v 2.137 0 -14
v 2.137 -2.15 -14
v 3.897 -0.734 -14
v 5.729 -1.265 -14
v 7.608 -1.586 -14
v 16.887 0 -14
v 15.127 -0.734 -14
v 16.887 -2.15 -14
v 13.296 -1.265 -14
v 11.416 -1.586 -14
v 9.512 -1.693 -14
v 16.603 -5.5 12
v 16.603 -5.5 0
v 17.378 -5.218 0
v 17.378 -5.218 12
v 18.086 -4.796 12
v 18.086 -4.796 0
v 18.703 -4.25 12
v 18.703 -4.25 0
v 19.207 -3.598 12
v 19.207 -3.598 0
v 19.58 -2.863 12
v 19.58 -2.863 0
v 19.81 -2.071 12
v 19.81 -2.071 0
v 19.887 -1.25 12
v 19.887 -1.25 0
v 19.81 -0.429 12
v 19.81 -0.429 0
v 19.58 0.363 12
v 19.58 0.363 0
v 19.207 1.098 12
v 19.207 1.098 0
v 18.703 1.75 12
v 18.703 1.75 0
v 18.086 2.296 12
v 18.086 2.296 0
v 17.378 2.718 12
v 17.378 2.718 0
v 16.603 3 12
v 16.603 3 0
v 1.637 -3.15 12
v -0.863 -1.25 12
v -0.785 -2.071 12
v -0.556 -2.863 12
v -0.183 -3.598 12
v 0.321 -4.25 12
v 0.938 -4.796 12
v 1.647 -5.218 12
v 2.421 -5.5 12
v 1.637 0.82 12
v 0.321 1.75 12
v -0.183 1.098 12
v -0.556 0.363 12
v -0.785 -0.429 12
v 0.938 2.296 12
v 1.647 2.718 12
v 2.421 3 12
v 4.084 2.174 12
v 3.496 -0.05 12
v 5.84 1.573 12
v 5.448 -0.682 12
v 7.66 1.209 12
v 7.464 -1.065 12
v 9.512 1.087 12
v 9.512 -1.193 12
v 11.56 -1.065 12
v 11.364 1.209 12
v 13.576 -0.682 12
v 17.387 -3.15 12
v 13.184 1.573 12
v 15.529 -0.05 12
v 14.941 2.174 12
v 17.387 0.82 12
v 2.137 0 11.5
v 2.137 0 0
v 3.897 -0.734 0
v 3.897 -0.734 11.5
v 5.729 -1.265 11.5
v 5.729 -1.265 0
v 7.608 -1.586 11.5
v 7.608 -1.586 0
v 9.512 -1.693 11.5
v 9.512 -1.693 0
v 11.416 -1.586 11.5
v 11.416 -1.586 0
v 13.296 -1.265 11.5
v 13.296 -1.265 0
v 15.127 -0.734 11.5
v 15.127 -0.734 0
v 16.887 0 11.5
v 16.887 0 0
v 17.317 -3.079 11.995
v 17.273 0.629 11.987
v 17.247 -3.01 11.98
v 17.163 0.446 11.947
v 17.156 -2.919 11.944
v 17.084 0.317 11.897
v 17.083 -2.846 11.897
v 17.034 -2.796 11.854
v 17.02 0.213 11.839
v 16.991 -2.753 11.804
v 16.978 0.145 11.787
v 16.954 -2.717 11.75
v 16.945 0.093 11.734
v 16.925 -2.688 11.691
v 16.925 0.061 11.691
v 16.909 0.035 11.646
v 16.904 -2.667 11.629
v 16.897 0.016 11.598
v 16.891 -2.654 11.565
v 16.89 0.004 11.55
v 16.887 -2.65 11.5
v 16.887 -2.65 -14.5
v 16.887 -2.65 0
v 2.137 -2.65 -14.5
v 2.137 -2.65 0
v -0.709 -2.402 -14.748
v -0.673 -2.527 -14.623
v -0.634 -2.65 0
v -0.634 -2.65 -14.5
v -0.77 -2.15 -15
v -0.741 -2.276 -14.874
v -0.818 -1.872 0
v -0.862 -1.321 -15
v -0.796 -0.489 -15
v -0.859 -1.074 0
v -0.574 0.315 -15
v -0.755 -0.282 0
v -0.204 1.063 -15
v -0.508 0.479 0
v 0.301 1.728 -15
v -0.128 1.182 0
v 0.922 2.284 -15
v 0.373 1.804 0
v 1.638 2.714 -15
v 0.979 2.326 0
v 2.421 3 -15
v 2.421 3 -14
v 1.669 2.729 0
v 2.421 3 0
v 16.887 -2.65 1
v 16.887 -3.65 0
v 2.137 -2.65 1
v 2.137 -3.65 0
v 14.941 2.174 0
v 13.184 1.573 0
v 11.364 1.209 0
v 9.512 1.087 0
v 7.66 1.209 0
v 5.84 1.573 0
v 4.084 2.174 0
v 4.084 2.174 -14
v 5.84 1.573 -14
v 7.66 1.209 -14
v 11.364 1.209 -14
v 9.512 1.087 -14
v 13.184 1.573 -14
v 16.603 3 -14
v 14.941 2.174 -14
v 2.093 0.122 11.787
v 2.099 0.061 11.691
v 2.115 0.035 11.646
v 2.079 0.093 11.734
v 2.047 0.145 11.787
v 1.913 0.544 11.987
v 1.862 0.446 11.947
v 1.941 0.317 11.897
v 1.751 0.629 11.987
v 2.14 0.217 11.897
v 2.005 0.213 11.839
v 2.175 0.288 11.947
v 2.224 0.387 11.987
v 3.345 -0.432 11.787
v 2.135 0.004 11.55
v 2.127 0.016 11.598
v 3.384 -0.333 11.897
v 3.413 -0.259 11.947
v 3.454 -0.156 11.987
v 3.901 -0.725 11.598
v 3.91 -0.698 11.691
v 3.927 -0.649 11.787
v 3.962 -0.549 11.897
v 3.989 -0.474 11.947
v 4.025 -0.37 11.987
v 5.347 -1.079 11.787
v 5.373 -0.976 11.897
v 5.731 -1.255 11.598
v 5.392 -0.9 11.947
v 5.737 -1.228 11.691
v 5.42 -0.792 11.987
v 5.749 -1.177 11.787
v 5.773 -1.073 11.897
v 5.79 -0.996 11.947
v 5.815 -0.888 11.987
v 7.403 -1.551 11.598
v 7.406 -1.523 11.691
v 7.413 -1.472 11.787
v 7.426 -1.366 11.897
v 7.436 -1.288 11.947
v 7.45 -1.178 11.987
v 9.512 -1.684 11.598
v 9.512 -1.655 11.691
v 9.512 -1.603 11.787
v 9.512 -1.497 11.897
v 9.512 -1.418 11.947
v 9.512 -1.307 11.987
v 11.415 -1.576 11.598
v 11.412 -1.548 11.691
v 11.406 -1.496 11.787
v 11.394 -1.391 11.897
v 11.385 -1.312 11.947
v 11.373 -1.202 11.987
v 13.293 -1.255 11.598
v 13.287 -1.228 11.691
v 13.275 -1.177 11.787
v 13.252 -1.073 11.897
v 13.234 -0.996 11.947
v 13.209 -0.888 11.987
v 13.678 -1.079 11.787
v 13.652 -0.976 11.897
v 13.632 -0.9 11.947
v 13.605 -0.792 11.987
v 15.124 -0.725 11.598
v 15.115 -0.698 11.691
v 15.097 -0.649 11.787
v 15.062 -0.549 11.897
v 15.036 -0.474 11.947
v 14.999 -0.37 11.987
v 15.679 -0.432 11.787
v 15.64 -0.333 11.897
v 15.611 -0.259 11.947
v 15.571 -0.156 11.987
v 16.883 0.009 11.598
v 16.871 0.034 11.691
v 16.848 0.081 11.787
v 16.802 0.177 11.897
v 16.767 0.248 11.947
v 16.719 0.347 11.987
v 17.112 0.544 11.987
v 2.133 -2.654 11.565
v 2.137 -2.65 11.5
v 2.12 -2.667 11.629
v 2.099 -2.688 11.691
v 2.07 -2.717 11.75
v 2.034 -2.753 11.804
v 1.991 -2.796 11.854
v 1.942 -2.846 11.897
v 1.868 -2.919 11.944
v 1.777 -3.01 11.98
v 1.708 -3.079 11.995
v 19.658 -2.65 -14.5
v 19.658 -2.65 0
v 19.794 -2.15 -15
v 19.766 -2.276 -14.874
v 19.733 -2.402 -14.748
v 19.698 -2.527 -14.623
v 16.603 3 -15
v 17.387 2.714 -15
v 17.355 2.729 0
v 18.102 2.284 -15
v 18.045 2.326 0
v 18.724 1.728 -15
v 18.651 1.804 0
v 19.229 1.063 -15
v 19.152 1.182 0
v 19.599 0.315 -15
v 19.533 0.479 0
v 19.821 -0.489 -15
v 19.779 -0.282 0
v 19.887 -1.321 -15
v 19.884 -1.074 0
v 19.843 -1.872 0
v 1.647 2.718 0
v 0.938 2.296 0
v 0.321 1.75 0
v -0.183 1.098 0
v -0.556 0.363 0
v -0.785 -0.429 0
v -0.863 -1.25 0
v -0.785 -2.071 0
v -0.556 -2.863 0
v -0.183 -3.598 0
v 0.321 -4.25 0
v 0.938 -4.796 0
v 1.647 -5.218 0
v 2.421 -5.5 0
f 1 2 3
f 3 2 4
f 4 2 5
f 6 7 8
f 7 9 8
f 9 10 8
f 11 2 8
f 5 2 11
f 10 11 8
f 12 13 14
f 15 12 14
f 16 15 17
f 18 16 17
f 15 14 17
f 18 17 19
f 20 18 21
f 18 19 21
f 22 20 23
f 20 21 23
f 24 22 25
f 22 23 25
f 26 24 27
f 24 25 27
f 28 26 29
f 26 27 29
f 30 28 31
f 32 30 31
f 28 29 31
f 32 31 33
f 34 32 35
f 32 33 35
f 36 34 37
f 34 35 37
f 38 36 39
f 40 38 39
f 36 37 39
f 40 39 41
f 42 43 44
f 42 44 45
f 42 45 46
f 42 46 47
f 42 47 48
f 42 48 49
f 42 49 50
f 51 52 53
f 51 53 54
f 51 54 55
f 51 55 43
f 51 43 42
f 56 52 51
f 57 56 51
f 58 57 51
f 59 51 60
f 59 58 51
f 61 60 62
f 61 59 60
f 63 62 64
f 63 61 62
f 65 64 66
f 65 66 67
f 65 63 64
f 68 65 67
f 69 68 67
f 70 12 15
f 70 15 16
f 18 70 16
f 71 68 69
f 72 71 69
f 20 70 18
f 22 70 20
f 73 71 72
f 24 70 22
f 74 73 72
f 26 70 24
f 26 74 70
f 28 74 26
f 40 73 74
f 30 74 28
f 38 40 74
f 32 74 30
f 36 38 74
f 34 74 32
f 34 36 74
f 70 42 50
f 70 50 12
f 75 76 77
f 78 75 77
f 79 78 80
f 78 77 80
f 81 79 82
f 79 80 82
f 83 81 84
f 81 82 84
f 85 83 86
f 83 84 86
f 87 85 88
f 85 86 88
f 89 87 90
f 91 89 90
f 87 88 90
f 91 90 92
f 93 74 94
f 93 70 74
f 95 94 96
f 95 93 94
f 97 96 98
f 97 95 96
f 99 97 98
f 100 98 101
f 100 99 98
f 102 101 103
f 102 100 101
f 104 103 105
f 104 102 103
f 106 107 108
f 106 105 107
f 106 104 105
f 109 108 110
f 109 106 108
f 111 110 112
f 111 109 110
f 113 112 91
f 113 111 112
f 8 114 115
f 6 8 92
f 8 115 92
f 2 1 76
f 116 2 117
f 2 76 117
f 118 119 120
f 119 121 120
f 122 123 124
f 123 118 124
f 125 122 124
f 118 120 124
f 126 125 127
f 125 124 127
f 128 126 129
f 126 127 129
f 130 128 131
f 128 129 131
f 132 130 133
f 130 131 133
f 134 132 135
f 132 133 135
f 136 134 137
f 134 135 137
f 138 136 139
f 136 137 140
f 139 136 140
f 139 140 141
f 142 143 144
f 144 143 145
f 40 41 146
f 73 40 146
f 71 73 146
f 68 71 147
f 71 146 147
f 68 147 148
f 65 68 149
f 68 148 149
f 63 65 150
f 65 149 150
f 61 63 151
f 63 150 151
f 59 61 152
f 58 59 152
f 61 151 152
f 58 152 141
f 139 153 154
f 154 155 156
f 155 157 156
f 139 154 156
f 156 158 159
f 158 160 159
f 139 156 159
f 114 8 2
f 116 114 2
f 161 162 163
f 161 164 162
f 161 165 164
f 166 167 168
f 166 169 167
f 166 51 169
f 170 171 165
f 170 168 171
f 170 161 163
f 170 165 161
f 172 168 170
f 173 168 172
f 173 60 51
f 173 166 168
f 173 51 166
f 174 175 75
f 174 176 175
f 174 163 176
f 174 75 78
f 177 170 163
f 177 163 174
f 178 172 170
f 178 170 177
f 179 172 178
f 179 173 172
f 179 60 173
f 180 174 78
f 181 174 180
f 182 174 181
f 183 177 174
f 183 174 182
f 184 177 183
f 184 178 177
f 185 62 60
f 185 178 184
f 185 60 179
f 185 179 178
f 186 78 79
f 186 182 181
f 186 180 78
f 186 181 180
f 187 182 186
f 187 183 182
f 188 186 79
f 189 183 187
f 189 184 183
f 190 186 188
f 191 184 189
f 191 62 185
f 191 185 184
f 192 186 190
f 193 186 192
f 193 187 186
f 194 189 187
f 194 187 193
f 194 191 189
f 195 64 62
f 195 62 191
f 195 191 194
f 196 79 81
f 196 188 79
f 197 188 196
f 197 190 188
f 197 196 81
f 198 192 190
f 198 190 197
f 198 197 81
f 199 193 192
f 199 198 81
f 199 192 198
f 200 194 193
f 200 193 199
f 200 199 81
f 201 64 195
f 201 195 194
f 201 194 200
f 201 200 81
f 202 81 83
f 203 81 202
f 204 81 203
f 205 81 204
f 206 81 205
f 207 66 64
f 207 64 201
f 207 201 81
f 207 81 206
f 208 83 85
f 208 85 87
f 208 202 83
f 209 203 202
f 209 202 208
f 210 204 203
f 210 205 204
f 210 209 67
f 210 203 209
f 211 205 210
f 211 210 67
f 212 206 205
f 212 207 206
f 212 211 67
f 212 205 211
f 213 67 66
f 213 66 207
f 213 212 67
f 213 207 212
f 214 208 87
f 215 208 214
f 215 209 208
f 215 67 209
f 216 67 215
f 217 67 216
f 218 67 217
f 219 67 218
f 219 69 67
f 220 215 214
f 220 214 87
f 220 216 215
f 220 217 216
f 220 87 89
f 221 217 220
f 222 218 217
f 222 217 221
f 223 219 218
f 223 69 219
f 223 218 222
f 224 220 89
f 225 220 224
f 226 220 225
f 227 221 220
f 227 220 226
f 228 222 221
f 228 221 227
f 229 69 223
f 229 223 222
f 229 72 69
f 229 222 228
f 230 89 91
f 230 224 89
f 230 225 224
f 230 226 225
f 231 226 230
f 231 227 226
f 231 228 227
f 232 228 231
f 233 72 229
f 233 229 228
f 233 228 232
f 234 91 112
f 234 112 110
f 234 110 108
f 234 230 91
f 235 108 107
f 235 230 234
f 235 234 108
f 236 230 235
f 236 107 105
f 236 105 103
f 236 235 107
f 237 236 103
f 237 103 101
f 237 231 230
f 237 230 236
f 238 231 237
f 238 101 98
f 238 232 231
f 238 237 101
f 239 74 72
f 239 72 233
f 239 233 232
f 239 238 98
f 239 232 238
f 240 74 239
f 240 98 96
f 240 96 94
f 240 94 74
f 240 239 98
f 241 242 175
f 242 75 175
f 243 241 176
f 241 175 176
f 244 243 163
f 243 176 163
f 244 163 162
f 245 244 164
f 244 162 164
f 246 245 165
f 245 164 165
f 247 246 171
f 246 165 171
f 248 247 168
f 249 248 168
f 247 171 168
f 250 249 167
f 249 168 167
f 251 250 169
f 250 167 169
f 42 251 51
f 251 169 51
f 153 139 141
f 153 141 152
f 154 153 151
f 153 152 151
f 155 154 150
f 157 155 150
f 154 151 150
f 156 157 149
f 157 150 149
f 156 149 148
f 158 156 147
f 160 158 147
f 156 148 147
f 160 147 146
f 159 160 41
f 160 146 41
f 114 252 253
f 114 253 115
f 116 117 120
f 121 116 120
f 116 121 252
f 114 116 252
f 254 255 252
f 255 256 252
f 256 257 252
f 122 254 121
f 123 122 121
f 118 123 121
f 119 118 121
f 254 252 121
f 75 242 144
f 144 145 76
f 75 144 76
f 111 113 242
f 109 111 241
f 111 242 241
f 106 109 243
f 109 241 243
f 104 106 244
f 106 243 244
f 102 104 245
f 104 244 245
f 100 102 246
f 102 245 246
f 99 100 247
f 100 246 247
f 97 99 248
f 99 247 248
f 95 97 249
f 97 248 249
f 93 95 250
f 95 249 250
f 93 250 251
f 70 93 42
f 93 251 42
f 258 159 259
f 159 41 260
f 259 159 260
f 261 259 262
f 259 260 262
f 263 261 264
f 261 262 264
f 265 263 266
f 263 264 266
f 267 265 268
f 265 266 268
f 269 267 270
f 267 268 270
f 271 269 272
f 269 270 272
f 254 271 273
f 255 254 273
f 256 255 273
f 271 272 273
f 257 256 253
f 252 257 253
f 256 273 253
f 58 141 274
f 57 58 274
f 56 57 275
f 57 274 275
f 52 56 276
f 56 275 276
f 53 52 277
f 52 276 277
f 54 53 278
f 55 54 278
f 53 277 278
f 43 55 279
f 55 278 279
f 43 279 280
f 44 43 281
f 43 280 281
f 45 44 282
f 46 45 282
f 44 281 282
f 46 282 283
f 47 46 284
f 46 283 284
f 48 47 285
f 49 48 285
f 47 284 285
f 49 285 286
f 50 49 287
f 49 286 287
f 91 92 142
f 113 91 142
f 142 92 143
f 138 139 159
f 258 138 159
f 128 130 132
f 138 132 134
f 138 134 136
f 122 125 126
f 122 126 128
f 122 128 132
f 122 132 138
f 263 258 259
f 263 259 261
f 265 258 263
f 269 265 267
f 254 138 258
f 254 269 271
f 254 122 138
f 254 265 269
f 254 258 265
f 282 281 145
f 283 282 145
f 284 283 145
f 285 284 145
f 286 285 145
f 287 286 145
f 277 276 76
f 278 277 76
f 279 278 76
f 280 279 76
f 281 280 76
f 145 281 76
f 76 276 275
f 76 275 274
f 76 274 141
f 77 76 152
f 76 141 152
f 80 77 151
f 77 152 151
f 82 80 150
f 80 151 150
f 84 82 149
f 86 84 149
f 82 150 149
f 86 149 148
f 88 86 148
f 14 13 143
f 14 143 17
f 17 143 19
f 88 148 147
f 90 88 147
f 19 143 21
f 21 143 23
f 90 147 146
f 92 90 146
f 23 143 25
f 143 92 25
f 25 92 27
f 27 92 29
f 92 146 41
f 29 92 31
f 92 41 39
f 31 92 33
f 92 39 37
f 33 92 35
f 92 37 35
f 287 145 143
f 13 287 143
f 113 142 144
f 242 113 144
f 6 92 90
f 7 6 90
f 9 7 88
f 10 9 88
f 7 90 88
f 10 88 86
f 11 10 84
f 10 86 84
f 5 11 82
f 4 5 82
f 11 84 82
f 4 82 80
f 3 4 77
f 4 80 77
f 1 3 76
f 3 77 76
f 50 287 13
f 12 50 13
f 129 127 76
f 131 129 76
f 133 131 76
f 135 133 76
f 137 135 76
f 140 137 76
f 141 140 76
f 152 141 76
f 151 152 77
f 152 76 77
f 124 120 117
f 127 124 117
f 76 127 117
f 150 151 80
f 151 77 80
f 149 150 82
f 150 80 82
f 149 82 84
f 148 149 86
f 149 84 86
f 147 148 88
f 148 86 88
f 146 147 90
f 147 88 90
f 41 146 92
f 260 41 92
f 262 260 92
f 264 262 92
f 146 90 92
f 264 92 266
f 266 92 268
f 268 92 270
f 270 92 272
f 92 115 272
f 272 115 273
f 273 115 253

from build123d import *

# Parameters (mm, degrees)
F1_DEPTH = 12
F3_DEPTH = 14
F5_DEPTH = 1
F6_SIZE  = 0.5
F7_SIZE  = 1
F8_SIZE  = 0.49999
F9_R     = 0.5


# Not quite as in the source:
# - a fillet or chamfer is up to 0.001 mm smaller than in the source, because OpenCascade refuses the exact size


with BuildPart() as f1:
    # F0 (on Top) → F1 (new body)
    with BuildSketch(Plane.XY):
        with BuildLine():
            ThreePointArc((2.421303573, 3), (-0.8627873361, -1.25), (2.421303573, -5.5))
            Line((2.421303573, -5.5), (16.6031217548, -5.5))
            ThreePointArc((16.6031217548, -5.5), (19.8872126639, -1.25), (16.6031217548, 3))
            ThreePointArc((16.6031217548, 3), (9.5122126639, 1.0867768062), (2.421303573, 3))
        make_face()
        with BuildLine():
            Line((4.6372126639, -2.65), (2.1372126639, -2.65))
            Line((2.1372126639, -2.65), (2.1372126639, 0))
            ThreePointArc((2.1372126639, 0), (9.5122126639, -1.6934638377), (16.8872126639, 0))
            Line((16.8872126639, 0), (16.8872126639, -2.65))
            Line((16.8872126639, -2.65), (4.6372126639, -2.65))
        make_face(mode=Mode.SUBTRACT)
    extrude(amount=F1_DEPTH)

    # F7
    f7_edges = [f1.edges().sort_by_distance(p)[0] for p in [
        (9.512213, -2.65, 0),
    ]]
    chamfer(f7_edges, length=F7_SIZE)

    # F9
    f9_edges = [f1.edges().sort_by_distance(p)[0] for p in [
        (9.512213, -2.65, 12),
        (2.137213, -1.325, 12),
        (9.512213, -1.693464, 12),
        (16.887213, -1.325, 12),
    ]]
    fillet(f9_edges, radius=F9_R)


with BuildPart() as f3:
    # F2 (on face) → F3 (new body)
    with BuildSketch(Plane(origin=(0, 0, 0), x_dir=(1, 0, 0), z_dir=(0, 0, -1))):
        with BuildLine():
            ThreePointArc((-0.6336811406, 2.65), (-0.3341866365, -0.8389848971), (2.421303573, -3))
            ThreePointArc((2.421303573, -3), (9.5122126639, -1.0867768062), (16.6031217548, -3))
            ThreePointArc((16.6031217548, -3), (19.3586119643, -0.8389848971), (19.6581064684, 2.65))
            Line((19.6581064684, 2.65), (16.8872126639, 2.65))
            Line((16.8872126639, 2.65), (16.8872126639, 0))
            ThreePointArc((16.8872126639, 0), (9.5122126639, 1.6934638377), (2.1372126639, 0))
            Line((2.1372126639, 0), (2.1372126639, 2.65))
            Line((2.1372126639, 2.65), (-0.6336811406, 2.65))
        make_face()
    extrude(amount=F3_DEPTH)

    # F4 (on face) → F5 (join)
    with BuildSketch(Plane(origin=(0, 0, -14), x_dir=(1, 0, 0), z_dir=(0, 0, -1))):
        with BuildLine():
            ThreePointArc((-0.6336811406, 2.65), (-0.3341866365, -0.8389848971), (2.421303573, -3))
            Line((2.421303573, -3), (16.6031217548, -3))
            ThreePointArc((16.6031217548, -3), (19.3586119643, -0.8389848971), (19.6581064684, 2.65))
            Line((19.6581064684, 2.65), (-0.6336811406, 2.65))
        make_face()
    extrude(amount=F5_DEPTH)

    # F6
    f6_edges = [f3.edges().sort_by_distance(p)[0] for p in [
        (9.512213, -2.65, -15),
    ]]
    chamfer(f6_edges, length=F6_SIZE)

    # F8 (size 0.5 in the source; OpenCascade refuses exactly that, so slightly less here)
    f8_edges = [f3.edges().sort_by_distance(p)[0] for p in [
        (9.512213, -2.65, -14),
    ]]
    chamfer(f8_edges, length=F8_SIZE)


solid = Compound([f1.part, f3.part])
